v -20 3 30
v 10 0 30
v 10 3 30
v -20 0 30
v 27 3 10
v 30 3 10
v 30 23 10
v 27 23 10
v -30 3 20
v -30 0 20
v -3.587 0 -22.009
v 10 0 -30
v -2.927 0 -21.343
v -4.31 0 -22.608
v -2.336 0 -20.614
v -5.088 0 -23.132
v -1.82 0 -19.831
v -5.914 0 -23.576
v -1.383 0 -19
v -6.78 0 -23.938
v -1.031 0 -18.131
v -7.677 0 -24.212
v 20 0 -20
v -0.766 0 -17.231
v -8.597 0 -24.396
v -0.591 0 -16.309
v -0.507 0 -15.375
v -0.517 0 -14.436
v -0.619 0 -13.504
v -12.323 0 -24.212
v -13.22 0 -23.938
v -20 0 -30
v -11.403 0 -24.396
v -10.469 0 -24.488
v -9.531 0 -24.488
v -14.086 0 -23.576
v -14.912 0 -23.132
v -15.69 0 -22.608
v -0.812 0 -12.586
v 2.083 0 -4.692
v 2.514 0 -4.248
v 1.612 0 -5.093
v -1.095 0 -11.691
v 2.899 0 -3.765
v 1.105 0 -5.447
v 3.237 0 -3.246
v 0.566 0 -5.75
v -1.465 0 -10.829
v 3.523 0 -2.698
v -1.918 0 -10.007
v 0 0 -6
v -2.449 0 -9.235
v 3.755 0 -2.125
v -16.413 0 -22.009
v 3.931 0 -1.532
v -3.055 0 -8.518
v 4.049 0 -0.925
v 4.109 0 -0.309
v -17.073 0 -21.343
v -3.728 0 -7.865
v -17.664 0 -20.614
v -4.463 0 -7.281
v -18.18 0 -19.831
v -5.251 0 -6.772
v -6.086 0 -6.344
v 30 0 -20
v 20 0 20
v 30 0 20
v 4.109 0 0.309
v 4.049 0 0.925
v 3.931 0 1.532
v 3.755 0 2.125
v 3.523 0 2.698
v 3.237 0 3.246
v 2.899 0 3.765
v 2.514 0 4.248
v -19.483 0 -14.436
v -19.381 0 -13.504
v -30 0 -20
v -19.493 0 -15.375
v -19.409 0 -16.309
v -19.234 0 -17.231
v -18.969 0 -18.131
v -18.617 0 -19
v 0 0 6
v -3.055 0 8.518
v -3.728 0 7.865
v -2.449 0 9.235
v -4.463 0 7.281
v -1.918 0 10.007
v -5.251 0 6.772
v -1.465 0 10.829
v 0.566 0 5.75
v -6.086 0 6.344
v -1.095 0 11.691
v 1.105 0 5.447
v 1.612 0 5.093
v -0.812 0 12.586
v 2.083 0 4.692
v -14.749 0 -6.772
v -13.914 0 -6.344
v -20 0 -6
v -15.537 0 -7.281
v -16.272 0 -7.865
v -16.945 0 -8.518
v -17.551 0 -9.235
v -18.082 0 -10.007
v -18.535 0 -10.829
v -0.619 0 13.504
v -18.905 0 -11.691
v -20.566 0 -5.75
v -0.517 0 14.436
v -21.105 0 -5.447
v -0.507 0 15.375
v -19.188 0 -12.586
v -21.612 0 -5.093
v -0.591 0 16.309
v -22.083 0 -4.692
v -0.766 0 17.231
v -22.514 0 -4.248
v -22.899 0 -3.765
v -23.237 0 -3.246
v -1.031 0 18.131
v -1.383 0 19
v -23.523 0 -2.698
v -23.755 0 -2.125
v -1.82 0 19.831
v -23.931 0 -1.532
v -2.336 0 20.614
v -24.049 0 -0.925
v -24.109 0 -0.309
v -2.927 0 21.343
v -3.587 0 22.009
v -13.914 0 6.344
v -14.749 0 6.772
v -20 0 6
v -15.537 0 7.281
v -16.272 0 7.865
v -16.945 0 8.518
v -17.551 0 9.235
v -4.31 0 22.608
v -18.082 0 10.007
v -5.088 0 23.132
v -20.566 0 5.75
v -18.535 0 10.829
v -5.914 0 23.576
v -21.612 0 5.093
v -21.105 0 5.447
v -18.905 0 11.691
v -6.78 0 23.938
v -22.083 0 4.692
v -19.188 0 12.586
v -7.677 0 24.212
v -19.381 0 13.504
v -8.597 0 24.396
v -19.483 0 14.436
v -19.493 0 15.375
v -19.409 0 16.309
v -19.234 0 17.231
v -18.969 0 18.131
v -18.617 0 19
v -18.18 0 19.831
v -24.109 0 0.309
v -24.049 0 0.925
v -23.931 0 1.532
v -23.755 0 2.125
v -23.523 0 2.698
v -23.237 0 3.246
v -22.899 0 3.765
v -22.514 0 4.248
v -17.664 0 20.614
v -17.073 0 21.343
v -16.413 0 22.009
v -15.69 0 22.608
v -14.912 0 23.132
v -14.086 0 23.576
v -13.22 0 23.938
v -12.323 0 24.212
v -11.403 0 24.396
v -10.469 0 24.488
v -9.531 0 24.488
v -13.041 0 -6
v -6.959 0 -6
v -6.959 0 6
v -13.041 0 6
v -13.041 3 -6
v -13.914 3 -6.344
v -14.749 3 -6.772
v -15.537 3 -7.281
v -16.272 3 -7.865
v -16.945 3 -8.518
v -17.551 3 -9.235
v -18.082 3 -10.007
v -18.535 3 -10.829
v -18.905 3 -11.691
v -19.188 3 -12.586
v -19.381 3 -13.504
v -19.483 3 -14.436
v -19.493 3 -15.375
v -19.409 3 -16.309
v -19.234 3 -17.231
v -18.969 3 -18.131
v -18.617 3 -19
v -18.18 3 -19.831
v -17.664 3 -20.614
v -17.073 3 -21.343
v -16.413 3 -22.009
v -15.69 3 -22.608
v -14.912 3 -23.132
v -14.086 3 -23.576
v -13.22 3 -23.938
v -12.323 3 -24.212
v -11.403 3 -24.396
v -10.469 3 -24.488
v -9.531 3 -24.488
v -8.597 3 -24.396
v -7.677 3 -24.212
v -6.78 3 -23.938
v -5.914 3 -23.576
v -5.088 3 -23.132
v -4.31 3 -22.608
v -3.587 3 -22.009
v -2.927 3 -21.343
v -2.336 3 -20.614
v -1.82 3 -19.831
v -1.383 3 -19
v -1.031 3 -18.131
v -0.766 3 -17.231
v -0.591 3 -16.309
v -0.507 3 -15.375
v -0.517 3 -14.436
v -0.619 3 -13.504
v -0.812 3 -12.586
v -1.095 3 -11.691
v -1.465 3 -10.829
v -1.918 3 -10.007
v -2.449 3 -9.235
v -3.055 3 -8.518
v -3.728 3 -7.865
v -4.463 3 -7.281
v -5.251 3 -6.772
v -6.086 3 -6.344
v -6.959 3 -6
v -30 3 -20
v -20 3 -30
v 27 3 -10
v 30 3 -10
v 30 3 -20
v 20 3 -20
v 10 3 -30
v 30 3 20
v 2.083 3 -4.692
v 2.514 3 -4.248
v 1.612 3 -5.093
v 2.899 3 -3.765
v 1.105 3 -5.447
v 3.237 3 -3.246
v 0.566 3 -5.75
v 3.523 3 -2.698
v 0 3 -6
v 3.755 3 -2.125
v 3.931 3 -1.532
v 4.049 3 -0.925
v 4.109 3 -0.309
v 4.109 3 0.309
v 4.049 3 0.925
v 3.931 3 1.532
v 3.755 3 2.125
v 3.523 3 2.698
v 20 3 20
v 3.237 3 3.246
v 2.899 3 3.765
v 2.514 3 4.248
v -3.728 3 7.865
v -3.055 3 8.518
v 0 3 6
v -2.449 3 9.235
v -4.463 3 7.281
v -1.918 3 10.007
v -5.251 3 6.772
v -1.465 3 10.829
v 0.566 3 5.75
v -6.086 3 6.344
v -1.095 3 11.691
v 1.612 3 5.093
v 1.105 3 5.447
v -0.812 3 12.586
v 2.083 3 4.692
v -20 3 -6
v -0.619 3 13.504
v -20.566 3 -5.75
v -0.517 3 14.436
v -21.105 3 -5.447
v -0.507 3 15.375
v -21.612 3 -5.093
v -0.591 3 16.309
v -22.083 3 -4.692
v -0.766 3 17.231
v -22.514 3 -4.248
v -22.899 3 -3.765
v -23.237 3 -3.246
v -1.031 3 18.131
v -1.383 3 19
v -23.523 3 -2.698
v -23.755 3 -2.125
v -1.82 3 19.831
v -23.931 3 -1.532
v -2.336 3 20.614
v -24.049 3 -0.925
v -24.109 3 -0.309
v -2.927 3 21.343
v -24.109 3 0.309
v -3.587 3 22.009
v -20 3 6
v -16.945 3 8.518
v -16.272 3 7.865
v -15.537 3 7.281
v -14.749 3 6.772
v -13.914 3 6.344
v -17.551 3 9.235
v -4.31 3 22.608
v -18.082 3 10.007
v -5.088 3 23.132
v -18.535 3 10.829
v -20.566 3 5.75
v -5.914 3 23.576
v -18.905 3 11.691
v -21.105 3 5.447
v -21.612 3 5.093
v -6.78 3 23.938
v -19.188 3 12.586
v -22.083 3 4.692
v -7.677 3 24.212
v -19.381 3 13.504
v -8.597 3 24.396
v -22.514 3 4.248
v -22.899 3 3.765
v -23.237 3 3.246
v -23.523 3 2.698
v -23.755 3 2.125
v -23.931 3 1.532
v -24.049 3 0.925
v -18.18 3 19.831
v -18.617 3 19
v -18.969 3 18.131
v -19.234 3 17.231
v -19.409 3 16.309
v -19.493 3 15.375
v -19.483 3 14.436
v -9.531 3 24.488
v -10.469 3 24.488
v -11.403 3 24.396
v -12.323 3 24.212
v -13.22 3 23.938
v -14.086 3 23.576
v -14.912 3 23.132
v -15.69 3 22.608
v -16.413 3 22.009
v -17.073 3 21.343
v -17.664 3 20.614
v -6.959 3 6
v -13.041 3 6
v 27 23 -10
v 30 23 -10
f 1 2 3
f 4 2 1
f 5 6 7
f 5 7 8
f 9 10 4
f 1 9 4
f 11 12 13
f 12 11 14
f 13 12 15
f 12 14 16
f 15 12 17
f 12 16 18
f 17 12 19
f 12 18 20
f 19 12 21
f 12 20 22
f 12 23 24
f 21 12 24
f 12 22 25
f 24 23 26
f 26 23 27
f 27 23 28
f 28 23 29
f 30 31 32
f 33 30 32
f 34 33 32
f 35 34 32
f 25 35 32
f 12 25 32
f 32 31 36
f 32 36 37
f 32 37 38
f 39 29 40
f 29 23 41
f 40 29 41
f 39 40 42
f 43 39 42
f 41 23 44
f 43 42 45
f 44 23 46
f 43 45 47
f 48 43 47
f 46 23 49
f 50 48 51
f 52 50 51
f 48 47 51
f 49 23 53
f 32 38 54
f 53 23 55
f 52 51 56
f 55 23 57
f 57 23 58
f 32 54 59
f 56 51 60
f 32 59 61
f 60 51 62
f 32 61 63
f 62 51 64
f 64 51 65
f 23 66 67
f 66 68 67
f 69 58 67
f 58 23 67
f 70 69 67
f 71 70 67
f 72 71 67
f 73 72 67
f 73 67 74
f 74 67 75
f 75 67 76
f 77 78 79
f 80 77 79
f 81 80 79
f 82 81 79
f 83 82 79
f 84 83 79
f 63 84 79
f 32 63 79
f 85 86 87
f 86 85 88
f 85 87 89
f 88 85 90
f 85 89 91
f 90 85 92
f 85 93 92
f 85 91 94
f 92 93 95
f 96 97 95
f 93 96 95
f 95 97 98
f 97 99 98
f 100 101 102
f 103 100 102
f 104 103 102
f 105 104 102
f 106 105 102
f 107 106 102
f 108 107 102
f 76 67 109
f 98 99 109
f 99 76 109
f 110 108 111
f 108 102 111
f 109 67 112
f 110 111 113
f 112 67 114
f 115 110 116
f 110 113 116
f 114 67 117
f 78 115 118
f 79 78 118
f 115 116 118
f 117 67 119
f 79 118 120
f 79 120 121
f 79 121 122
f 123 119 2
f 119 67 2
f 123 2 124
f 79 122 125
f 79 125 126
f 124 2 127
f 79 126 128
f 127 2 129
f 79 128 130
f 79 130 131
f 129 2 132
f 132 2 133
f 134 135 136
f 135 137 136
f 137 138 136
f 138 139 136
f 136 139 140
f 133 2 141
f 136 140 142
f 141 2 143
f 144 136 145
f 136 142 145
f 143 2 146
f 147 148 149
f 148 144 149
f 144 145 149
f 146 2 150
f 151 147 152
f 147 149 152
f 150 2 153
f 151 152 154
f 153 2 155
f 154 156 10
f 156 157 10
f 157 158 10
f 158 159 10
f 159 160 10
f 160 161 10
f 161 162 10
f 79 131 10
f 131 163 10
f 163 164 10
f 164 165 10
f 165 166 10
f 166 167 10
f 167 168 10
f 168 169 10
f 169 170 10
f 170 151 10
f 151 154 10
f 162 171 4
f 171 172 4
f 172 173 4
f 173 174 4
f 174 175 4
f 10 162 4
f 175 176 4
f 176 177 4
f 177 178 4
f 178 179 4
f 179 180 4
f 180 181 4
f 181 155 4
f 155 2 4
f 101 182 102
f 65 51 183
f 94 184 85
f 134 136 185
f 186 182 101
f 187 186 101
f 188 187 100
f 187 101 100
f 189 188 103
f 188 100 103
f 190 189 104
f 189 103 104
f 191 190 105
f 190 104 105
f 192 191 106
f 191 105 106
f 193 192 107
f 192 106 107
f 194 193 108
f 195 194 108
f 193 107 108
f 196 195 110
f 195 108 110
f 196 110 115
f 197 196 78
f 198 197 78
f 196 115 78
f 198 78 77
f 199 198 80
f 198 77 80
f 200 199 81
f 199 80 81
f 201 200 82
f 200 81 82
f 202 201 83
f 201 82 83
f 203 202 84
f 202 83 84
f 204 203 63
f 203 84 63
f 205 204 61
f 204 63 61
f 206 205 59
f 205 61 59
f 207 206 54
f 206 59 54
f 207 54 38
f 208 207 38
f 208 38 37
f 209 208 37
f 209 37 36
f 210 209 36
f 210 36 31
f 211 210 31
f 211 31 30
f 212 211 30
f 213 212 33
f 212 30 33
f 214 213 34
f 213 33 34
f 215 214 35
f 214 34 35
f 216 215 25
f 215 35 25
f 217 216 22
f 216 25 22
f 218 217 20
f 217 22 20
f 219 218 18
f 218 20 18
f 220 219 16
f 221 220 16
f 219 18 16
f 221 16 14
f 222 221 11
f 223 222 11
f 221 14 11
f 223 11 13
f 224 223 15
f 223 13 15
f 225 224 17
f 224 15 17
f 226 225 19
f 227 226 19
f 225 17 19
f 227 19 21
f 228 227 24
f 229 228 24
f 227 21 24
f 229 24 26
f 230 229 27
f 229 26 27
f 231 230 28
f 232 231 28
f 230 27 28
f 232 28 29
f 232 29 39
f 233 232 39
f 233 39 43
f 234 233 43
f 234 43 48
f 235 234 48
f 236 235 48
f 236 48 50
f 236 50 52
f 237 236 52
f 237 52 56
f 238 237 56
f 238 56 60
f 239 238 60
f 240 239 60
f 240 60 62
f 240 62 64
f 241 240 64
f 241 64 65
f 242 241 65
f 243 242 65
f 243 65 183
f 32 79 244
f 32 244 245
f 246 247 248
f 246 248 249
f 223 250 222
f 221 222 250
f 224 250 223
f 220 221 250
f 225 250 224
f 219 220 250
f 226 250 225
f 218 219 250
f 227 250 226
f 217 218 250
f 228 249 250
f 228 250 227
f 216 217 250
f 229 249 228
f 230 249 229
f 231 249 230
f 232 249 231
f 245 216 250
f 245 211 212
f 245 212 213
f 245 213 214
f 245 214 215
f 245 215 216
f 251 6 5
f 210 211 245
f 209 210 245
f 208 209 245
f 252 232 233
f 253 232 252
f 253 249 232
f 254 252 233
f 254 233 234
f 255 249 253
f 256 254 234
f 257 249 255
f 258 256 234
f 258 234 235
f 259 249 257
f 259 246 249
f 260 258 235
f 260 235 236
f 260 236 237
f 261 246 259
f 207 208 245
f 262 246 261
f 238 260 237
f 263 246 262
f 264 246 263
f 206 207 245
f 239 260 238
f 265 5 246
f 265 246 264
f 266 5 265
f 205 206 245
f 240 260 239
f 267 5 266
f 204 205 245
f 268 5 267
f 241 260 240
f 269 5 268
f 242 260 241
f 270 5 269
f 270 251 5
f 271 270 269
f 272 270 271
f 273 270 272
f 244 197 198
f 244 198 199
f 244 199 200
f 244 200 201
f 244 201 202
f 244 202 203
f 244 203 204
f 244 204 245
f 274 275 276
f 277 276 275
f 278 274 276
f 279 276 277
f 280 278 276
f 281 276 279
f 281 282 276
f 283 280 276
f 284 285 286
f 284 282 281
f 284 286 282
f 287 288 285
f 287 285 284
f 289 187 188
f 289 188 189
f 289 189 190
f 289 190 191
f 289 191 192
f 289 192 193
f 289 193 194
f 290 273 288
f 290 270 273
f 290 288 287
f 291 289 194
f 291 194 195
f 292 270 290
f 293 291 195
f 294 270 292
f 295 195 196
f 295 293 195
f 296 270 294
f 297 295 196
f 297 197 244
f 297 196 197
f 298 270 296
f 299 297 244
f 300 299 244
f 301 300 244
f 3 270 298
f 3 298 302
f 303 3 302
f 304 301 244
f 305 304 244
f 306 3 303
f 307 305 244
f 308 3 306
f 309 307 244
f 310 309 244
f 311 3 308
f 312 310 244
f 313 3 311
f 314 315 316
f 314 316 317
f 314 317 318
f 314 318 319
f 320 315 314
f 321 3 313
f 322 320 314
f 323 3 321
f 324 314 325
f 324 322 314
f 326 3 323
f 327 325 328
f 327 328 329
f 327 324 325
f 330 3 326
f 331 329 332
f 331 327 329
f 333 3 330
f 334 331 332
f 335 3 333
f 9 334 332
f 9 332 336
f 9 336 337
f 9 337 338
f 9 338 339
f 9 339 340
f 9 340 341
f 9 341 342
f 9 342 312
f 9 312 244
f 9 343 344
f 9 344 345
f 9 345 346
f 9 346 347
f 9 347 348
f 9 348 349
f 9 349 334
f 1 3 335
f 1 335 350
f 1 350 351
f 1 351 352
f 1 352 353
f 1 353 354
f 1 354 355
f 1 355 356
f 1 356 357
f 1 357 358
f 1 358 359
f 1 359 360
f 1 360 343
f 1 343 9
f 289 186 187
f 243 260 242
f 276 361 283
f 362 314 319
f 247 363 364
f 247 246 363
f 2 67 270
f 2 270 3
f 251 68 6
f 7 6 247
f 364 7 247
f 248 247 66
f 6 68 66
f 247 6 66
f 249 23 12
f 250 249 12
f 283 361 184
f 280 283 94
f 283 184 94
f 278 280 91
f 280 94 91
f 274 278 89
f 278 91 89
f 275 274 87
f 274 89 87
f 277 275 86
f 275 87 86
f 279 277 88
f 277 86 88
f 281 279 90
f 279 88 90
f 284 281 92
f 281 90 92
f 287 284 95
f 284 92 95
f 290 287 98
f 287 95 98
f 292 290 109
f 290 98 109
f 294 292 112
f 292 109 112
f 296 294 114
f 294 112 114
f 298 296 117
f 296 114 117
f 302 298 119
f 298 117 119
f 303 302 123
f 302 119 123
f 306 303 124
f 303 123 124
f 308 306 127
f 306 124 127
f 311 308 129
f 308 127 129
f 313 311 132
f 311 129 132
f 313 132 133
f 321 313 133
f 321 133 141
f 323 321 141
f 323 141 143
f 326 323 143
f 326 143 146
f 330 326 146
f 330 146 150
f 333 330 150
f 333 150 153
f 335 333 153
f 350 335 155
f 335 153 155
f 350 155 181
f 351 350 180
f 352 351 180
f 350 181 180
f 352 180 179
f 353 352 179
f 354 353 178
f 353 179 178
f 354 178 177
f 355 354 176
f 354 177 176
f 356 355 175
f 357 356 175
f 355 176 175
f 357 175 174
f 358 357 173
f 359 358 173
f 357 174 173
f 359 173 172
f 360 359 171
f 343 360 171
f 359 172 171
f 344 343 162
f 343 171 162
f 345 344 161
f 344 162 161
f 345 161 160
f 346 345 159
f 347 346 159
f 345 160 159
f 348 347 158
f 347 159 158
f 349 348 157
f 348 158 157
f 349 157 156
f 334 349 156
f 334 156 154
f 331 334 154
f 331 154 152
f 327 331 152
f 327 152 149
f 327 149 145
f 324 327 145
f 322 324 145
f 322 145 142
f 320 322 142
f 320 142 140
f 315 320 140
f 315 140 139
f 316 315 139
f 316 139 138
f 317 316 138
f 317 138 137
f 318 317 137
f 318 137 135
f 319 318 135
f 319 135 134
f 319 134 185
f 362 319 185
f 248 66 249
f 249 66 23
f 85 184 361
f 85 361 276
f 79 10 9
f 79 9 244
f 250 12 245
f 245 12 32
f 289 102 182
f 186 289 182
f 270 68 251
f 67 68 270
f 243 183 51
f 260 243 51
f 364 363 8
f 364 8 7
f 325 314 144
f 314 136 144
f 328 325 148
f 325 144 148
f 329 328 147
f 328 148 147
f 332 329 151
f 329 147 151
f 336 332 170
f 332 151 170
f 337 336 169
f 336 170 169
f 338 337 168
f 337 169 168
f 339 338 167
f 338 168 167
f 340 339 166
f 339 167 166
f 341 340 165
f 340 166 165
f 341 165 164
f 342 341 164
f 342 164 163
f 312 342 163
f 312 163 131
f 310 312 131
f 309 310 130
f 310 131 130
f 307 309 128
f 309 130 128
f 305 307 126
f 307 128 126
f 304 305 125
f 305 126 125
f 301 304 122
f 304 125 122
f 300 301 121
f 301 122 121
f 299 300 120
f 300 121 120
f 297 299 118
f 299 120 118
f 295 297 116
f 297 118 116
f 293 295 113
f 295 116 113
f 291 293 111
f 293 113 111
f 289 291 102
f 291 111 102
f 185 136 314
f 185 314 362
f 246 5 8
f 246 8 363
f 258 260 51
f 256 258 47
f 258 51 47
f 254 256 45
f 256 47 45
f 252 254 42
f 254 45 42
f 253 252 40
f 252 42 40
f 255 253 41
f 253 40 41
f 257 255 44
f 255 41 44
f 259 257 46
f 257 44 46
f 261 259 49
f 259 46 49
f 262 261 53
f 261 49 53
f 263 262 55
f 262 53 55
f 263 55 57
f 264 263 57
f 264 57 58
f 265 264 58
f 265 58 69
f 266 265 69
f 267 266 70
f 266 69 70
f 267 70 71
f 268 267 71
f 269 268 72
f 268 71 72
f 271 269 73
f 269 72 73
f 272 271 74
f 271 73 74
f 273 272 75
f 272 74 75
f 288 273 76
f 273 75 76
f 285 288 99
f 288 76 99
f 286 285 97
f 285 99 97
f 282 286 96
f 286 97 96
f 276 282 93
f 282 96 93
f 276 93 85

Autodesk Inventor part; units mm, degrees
ref_plane "YZ Plane" through (0, 0, 0) normal (1, 0, 0) x (0, 1, 0)
ref_plane "XZ Plane" through (0, 0, 0) normal (0, 1, 0) x (-1, 0, 0)
ref_plane "XY Plane" through (0, 0, 0) normal (0, 0, 1) x (1, 0, 0)
sketch "Sketch1" plane through (0, 0, 0) normal (0, 1, 0) x (-1, 0, 0)
  line L0 (0, 0) -> (30, 0)
  line L1 (0, 0) -> (-30, 0)
  line L2 (30, 0) -> (-10, 0)
  line L3 (-10, 0) -> (-10, 30)
  line L4 (-10, 0) -> (-10, -30)
  line L5 (-10, 30) -> (20, 30)
  line L6 (-10, -30) -> (20, -30)
  line L7 (20, 30) -> (20, -30)
  line L8 (30, 0) -> (30, 20)
  line L9 (30, 0) -> (30, -20)
  line L10 (30, 20) -> (20, 30)
  line L11 (30, -20) -> (20, -30)
  line L12 (-30, 0) -> (-30, 20)
  line L13 (-30, 0) -> (-30, -20)
  line L14 (-30, 20) -> (-20, 20)
  line L15 (-20, 20) -> (-10, 30)
  line L16 (-30, -20) -> (-20, -20)
  line L17 (-20, -20) -> (-10, -30)
  line L18 (20, 0) -> (20, 6)
  line L19 (20, 0) -> (20, -6)
  arc A0 (20, -6) -> (20, 6) centre (17.6853, 0) ccw
  line L20 (0, 0) -> (0, 6)
  line L21 (0, 0) -> (0, -6)
  arc A1 (0, 6) -> (0, -6) centre (2.3147, 0) ccw
  line L22 (0, 30) -> (10, 30)
  circle A2 centre (10.0225, 15.038) radius 9
  line L23 (0, -30) -> (10, -30)
  circle A3 centre (10, -15) radius 9
  line L24 (20, 6) -> (20, -6)
  line L25 (20, 6) -> (0, 6)
  line L26 (20, -6) -> (0, -6)
  point P0 (10, -6)
  dimension "d0" = 30
  dimension "d1" = 30
  dimension "d2" = 40
  dimension "d5" = 30
  dimension "d6" = 30
  dimension "d8" = 30
  dimension "d9" = 30
  dimension "d10" = 20
  dimension "d11" = 20
  dimension "d12" = 20
  dimension "d13" = 20
  dimension "d14" = 10
  dimension "d15" = 10
  dimension "d16" = 6
  dimension "d17" = 6
  dimension "d18" = 6.431
  dimension "d19" = 6
  dimension "d20" = 6
  dimension "d22" = 6.431
  dimension "d25" = 18
  dimension "d28" = 18
extrude "Extrusion1" add sketch "Sketch1" along normal blind 3 contours A1 L26 L7 L6 L4 L1 | L1 L3 L5 L7 L25 A1 | A0 L7 L10 L8 L0 | L0 L9 L11 L7 A0 | L4 L17 L16 L13 L1 | L1 L12 L14 L15 L3
sketch "Sketch2" plane through (0, 3, 0) normal (0, 1, 0) x (1, 0, 0)
  line L0 (30, 10) -> (30, -10)
  line L1 (30, 10) -> (27, 10)
  line L2 (27, 10) -> (27, -10)
  line L3 (27, -10) -> (30, -10)
  line L4 (-19, -30) -> (-10, -30)
  circle A0 centre (-10, -15) radius 9.5
  circle A1 centre (-10, 15) radius 9.5
  point P0 (0, 0)
  dimension "d34" = 20
  dimension "d35" = 3
  dimension "d37" = 19
  dimension "d39" = 19
hole "Hole1" at (-10, 3, 15) direction (0, -1, 0) diameter 19 end through all
hole "Hole2" at (-10, 3, -15) direction (0, -1, 0) diameter 19 end through all
sketch "Sketch3" plane through (0, 3, 0) normal (0, 1, 0) x (1, 0, 0)
  line L0 (30, 10) -> (30, -10)
  line L1 (30, -10) -> (27, -10)
  line L2 (27, -10) -> (27, 10)
  line L3 (27, 10) -> (30, 10)
  point P0 (0, 0)
extrude "Extrusion2" add sketch "Sketch3" along normal blind 20
properties part number "Ultrasonic_Body"
